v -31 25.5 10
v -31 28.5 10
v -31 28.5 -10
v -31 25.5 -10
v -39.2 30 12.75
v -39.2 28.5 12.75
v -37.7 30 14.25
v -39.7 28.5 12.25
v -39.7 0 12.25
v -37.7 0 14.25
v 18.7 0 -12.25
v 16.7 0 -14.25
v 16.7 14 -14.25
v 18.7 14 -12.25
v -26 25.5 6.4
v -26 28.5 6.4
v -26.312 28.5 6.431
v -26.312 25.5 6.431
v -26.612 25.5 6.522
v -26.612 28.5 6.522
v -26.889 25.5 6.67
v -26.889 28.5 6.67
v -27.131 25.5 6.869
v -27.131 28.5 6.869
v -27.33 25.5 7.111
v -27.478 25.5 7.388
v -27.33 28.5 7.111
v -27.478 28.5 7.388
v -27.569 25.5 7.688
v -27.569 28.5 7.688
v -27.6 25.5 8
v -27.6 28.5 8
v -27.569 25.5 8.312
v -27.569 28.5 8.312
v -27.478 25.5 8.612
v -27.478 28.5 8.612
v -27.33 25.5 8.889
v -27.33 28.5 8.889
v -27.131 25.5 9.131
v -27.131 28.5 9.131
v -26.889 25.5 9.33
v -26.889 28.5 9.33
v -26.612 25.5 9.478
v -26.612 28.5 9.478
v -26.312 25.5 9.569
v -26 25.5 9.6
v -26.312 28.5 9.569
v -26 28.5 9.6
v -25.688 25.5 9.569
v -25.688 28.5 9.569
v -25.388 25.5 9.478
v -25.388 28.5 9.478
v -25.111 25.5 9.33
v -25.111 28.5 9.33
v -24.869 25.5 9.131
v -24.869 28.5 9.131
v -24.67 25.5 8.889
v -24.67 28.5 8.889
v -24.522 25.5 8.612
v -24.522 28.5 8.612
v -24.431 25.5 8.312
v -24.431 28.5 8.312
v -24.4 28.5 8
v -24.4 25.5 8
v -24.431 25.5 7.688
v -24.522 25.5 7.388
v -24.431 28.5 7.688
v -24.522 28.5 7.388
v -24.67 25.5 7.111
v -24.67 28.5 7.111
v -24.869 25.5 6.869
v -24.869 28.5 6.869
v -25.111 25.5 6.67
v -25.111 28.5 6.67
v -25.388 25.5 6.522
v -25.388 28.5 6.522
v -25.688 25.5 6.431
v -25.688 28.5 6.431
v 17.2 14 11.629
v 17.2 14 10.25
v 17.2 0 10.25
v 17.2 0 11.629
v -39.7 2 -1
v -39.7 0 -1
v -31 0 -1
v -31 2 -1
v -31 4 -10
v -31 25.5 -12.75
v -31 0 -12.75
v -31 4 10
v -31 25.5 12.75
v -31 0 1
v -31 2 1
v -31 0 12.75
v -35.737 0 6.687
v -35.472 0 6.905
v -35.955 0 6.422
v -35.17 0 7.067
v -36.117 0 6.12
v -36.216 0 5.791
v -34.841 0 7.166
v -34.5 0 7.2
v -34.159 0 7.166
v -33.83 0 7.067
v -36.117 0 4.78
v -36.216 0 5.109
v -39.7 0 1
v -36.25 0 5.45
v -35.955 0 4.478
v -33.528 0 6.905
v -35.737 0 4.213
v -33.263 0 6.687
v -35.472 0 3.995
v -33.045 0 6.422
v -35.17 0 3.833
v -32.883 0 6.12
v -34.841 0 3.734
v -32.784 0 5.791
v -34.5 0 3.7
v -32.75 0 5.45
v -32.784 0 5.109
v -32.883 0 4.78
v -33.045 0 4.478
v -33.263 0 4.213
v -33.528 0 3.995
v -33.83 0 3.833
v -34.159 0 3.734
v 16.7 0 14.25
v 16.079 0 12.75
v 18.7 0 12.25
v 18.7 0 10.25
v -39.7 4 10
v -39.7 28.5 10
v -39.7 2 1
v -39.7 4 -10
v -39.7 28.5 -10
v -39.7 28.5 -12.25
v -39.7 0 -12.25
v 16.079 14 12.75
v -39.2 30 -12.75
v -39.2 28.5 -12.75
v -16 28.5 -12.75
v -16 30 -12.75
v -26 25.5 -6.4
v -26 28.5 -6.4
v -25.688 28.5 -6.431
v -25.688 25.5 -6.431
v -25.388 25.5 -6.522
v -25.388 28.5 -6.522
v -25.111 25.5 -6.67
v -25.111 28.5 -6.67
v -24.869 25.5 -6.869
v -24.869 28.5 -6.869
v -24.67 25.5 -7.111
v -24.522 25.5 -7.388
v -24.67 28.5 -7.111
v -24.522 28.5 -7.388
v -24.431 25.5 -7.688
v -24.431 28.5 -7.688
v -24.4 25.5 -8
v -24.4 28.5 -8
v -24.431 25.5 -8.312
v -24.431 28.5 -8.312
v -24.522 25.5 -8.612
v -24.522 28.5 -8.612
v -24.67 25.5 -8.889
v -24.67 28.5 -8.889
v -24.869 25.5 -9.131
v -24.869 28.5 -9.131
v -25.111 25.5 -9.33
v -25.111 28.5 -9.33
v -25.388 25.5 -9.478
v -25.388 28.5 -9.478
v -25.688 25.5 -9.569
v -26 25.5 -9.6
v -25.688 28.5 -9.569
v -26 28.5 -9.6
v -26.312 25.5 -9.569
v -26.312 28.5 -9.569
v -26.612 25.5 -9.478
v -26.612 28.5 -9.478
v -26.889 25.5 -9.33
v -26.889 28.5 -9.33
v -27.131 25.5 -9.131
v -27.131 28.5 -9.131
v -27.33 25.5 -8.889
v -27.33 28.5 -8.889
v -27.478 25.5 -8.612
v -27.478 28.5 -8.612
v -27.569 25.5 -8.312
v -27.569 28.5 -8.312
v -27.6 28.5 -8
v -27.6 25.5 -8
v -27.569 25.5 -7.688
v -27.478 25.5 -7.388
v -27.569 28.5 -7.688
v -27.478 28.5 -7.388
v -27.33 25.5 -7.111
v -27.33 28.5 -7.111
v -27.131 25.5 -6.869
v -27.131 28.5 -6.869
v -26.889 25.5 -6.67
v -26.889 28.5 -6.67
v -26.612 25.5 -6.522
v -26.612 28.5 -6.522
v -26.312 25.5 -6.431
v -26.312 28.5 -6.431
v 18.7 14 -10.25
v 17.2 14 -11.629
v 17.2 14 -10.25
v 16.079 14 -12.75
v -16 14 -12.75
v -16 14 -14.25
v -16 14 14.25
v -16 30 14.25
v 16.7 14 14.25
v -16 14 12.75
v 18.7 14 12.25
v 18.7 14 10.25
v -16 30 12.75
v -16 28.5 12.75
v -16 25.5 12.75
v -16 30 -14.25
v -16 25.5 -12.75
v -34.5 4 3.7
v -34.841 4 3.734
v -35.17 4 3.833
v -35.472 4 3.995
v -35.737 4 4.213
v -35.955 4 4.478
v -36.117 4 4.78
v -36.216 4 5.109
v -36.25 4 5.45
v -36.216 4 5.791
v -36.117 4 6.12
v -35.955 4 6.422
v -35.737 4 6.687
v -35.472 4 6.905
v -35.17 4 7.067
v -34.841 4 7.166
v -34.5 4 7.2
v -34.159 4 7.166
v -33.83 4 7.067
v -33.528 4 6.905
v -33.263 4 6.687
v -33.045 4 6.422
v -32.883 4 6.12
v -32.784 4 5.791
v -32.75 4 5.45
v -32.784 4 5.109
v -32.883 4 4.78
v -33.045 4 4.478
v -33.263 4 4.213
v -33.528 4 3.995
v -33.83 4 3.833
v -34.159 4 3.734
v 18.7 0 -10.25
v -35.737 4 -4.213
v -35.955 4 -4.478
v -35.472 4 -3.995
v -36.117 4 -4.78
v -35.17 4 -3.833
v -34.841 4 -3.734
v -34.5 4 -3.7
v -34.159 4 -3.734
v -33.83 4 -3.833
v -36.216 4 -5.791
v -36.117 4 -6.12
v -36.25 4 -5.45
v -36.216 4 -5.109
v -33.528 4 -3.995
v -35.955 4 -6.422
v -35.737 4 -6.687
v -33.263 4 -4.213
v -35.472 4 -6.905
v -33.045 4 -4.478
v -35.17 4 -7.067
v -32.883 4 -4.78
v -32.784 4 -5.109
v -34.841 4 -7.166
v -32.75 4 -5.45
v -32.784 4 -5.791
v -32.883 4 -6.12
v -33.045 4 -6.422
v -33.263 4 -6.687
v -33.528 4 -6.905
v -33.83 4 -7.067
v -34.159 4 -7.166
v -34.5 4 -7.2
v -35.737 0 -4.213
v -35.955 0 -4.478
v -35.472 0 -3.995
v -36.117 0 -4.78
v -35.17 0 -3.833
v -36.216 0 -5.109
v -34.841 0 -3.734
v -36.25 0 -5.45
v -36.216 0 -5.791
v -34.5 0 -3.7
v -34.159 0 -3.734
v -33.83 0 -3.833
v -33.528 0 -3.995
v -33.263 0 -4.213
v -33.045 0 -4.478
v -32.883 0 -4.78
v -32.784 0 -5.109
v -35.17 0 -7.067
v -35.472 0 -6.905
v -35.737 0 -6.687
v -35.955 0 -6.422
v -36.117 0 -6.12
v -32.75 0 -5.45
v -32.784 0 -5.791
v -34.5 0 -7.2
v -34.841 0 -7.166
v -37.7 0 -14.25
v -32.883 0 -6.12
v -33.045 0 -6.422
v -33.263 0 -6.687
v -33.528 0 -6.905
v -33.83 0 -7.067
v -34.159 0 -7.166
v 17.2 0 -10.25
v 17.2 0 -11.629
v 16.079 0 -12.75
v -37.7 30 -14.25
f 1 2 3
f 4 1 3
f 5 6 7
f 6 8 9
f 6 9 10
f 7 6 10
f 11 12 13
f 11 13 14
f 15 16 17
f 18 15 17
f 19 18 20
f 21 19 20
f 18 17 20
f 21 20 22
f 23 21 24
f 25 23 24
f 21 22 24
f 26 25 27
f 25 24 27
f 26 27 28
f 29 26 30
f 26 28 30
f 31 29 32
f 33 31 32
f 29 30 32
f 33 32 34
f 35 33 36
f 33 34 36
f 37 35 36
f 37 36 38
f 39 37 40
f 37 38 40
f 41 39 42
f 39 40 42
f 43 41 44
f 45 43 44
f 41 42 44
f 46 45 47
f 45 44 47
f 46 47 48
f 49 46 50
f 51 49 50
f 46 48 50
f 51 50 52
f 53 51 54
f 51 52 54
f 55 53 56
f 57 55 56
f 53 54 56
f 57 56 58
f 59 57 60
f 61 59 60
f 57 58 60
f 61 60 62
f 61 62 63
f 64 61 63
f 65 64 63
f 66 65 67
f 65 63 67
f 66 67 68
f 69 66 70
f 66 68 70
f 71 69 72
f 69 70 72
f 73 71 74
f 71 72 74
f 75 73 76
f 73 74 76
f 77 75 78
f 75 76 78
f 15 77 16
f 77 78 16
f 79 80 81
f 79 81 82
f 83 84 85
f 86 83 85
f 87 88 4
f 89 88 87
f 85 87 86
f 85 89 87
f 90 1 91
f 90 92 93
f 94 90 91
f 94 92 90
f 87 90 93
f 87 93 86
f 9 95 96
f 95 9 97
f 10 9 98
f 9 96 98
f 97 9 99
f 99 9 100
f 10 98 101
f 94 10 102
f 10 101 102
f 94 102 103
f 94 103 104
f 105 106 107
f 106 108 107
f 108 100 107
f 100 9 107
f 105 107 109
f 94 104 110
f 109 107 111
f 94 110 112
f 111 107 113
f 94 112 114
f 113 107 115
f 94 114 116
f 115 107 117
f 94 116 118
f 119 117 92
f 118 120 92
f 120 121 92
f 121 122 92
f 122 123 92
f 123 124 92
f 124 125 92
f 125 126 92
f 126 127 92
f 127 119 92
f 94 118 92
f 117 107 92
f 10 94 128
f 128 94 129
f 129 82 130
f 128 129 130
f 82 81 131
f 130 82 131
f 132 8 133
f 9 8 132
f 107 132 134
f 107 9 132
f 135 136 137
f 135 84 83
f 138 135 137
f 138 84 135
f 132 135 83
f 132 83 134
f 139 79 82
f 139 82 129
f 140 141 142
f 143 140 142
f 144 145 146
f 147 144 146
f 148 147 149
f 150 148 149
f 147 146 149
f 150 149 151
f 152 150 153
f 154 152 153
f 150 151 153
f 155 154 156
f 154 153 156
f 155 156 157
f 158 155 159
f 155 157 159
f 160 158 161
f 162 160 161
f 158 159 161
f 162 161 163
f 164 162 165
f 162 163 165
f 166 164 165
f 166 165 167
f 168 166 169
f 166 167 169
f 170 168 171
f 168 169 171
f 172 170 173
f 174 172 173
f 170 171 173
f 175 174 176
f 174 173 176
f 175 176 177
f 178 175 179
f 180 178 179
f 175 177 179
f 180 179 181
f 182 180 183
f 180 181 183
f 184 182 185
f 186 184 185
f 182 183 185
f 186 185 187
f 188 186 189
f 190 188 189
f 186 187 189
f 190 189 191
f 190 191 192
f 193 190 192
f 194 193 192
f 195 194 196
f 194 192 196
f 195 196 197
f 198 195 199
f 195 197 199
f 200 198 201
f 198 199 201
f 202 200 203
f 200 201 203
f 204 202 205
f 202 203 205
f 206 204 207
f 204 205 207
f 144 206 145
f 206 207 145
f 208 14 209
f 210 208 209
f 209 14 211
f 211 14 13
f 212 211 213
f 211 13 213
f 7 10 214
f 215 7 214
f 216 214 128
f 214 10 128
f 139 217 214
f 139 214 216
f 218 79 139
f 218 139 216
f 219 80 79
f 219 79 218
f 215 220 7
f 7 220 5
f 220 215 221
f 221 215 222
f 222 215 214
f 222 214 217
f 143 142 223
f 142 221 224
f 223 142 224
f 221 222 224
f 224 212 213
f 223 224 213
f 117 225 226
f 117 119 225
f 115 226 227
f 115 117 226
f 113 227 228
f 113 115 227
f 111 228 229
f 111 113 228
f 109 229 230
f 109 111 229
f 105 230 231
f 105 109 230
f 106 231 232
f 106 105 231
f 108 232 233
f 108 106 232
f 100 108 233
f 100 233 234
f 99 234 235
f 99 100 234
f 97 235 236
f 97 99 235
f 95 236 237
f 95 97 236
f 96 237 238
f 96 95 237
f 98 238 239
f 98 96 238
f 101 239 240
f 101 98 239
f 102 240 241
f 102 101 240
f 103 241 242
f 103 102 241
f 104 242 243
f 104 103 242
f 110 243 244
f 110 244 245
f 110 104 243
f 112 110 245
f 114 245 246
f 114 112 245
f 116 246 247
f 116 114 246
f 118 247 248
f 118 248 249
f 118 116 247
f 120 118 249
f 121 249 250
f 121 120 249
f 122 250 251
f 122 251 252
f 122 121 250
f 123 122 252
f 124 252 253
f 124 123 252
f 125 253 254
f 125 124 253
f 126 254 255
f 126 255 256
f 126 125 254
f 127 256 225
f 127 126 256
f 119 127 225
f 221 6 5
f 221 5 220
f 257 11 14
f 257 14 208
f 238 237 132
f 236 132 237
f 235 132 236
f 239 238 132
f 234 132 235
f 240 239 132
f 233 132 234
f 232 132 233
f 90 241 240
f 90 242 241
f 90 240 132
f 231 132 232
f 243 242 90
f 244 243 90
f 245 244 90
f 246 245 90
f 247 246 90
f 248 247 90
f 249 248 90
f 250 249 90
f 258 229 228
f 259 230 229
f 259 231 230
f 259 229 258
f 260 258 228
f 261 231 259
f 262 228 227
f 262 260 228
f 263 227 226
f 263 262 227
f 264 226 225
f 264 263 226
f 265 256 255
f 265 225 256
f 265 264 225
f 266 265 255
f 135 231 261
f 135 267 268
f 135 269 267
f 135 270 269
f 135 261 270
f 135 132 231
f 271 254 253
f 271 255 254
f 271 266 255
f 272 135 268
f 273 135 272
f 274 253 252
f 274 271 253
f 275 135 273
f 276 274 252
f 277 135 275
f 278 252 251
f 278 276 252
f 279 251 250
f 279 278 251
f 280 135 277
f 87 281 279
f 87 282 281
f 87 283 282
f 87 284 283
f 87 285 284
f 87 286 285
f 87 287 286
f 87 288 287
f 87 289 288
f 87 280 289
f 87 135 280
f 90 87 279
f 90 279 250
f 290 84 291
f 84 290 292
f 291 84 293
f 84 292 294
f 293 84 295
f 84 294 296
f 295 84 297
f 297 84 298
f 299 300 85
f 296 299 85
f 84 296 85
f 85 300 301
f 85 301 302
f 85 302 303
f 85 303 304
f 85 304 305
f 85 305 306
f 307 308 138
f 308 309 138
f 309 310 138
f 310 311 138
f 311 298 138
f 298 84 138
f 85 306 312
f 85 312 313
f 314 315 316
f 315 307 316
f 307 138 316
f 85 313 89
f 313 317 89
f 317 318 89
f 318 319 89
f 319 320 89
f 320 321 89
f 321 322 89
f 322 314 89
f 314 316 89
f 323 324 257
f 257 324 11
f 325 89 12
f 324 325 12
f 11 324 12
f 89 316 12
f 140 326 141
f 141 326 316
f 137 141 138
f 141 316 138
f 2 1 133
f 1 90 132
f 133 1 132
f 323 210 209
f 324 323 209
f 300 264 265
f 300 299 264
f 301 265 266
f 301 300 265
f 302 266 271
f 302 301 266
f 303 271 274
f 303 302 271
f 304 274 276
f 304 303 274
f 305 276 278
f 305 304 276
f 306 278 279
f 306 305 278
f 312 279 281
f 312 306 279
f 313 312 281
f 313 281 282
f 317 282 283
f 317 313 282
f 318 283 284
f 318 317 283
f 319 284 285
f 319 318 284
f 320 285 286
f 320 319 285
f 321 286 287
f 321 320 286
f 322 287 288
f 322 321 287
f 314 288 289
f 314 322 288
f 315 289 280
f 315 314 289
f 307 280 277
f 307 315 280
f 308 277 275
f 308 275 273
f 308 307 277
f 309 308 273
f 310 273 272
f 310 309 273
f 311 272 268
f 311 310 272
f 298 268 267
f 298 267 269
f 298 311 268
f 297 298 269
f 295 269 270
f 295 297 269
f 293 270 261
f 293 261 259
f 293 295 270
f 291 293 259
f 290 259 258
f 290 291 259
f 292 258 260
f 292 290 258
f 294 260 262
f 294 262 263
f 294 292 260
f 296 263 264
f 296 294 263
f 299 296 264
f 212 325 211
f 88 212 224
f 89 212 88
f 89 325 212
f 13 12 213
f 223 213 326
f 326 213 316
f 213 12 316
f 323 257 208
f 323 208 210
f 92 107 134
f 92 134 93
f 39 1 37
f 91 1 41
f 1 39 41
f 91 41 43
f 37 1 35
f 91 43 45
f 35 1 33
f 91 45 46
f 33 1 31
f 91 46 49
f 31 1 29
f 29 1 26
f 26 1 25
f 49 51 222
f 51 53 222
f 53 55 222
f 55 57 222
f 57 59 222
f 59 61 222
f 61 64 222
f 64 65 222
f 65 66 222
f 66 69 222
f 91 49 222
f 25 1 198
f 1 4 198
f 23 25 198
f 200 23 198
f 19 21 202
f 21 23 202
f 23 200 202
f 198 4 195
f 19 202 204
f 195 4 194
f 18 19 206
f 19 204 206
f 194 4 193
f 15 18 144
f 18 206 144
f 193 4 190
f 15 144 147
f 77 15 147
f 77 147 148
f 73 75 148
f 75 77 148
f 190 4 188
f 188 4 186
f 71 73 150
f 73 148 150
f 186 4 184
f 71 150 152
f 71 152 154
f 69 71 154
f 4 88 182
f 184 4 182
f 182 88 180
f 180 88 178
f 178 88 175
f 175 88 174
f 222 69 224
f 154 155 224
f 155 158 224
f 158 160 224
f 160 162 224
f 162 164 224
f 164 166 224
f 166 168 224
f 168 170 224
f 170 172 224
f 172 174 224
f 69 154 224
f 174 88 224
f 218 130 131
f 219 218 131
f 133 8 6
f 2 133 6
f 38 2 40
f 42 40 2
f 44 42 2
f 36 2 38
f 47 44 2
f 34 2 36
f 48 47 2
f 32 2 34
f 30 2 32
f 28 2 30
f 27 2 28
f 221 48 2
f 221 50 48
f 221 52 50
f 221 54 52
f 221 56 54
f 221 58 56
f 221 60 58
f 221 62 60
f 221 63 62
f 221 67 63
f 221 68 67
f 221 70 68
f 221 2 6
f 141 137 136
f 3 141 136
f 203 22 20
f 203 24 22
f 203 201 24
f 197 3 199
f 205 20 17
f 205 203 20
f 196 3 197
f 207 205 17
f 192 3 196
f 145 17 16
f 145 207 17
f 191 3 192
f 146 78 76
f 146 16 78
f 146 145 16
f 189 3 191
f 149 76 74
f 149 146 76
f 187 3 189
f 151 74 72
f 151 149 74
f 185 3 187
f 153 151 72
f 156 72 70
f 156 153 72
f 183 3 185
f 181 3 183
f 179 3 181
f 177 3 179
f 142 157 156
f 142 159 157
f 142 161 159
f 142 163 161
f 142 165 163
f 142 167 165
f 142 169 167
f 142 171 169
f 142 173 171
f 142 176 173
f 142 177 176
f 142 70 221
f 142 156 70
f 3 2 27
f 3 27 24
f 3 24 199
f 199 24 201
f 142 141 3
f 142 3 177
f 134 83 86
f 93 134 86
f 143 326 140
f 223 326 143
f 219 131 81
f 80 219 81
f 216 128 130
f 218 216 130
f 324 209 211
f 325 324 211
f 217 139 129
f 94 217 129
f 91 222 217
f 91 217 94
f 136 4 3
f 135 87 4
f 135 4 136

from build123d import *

# Parameters (mm, degrees)
SZKIC1_W                      = 8.7
SZKIC1_H                      = 9
SZKIC1_R                      = 1.75
DODANIE_WYCI_GNI_CIE1_DEPTH   = 2
DODANIE_WYCI_GNI_CIE1_2_DEPTH = 2
SZKIC2_W                      = 8.7
SZKIC2_H                      = 20
SZKIC2_R                      = 1.75
DODANIE_WYCI_GNI_CIE2_DEPTH   = 2
DODANIE_WYCI_GNI_CIE3_DEPTH   = 14
WYTNIJ_WYCI_GNI_CIE1_REACH    = 46.443
DODANIE_WYCI_GNI_CIE7_DEPTH   = 14.5
SZKIC10_W                     = 15
SZKIC10_H                     = 25.5
SZKIC10_R                     = 1.6
DODANIE_WYCI_GNI_CIE9_DEPTH   = 3
DODANIE_WYCI_GNI_CIE10_DEPTH  = 1.5


with BuildPart() as part:
    # Szkic1 → Dodanie-wyciągnięcie1 (new body)
    with BuildSketch(Plane(origin=(0, 0, 0), x_dir=(1, 0, 0), z_dir=(0, 1, 0))):
        with Locations((-35.35, 5.5)):
            Rectangle(SZKIC1_W, SZKIC1_H)
        with Locations(Location((-34.5, 5.45, 0), (0, 0, 270))):
            Circle(SZKIC1_R, mode=Mode.SUBTRACT)
    extrude(amount=DODANIE_WYCI_GNI_CIE1_DEPTH)



with BuildPart() as body_2:
    # Szkic1 → Dodanie-wyci_gni_cie1 2 (new body)
    with BuildSketch(Plane(origin=(0, 0, 0), x_dir=(1, 0, 0), z_dir=(0, 1, 0))):
        with Locations((-35.35, -5.5)):
            Rectangle(SZKIC1_W, SZKIC1_H)
        with Locations(Location((-34.5, -5.45, 0), (0, 0, 90))):
            Circle(SZKIC1_R, mode=Mode.SUBTRACT)
    extrude(amount=DODANIE_WYCI_GNI_CIE1_2_DEPTH)


with BuildPart() as part_1:
    add(part.part)

    add(body_2.part)  # Dodanie-wyciągnięcie2 merges body 2
    # Szkic2 → Dodanie-wyciągnięcie2 (add)
    with BuildSketch(Plane(origin=(0, 2, 0), x_dir=(1, 0, 0), z_dir=(0, 1, 0))):
        with Locations((-35.35, 0)):
            Rectangle(SZKIC2_W, SZKIC2_H)
        with Locations(Location((-34.5, 5.45, 0), (0, 0, 270))):
            Circle(SZKIC2_R, mode=Mode.SUBTRACT)
        with Locations(Location((-34.5, -5.45, 0), (0, 0, 90))):
            Circle(SZKIC2_R, mode=Mode.SUBTRACT)
    extrude(amount=DODANIE_WYCI_GNI_CIE2_DEPTH)

    # Szkic5 → Dodanie-wyciągnięcie3 (add)
    with BuildSketch(Plane(origin=(0, 0, 0), x_dir=(-1, 0, 0), z_dir=(0, -1, 0))):
        Polygon((39.7, -10), (39.7, -12.25), (37.7, -14.25), (-16.7, -14.25), (-18.7, -12.25), (-18.7, -10.25), (31, -10.25), (31, -10), align=None)
        Polygon((39.7, 10), (39.7, 12.25), (37.7, 14.25), (-16.7, 14.25), (-18.7, 12.25), (-18.7, 10.25), (31, 10.25), (31, 10), align=None)
    extrude(amount=-DODANIE_WYCI_GNI_CIE3_DEPTH)

    # Szkic7 → Wytnij-wyciągnięcie1 (cut, up to next)
    with BuildSketch(Plane(origin=(0, 14, 0), x_dir=(1, 0, 0), z_dir=(0, 1, 0)), mode=Mode.PRIVATE) as wytnij_wyci_gni_cie1_sk1:
        Polygon((-31, 10.25), (17.2, 10.25), (17.2, 11.628679656), (16.078679656, 12.75), (-31, 12.75), align=None)
    wytnij_wyci_gni_cie1_tool1 = extrude(wytnij_wyci_gni_cie1_sk1.sketch, amount=-WYTNIJ_WYCI_GNI_CIE1_REACH, mode=Mode.PRIVATE) & part_1.part
    # Szkic7 → Wytnij-wyciągnięcie1 (cut, up to next)
    with BuildSketch(Plane(origin=(0, 14, 0), x_dir=(1, 0, 0), z_dir=(0, 1, 0)), mode=Mode.PRIVATE) as wytnij_wyci_gni_cie1_sk2:
        Polygon((16.078679656, -12.75), (-31, -12.75), (-31, -10.25), (17.2, -10.25), (17.2, -11.628679656), align=None)
    wytnij_wyci_gni_cie1_tool2 = extrude(wytnij_wyci_gni_cie1_sk2.sketch, amount=-WYTNIJ_WYCI_GNI_CIE1_REACH, mode=Mode.PRIVATE) & part_1.part
    add(wytnij_wyci_gni_cie1_tool1.solids().sort_by_distance((-7.024435, 14, -11.495405))[0], mode=Mode.SUBTRACT)
    add(wytnij_wyci_gni_cie1_tool2.solids().sort_by_distance((-7.024435, 14, 11.495405))[0], mode=Mode.SUBTRACT)

    # Szkic8 → Dodanie-wyciągnięcie7 (add)
    with BuildSketch(Plane(origin=(0, 14, 0), x_dir=(1, 0, 0), z_dir=(0, 1, 0))):
        Polygon((-31, 10), (-39.7, 10), (-39.7, 12.25), (-37.7, 14.25), (-16, 14.25), (-16, 12.75), (-31, 12.75), align=None)
        Polygon((-16, -12.75), (-31, -12.75), (-31, -10), (-39.7, -10), (-39.7, -12.25), (-37.7, -14.25), (-16, -14.25), align=None)
    extrude(amount=DODANIE_WYCI_GNI_CIE7_DEPTH)

    # Szkic10 → Dodanie-wyciągnięcie9 (add)
    with BuildSketch(Plane(origin=(0, 28.5, 0), x_dir=(1, 0, 0), z_dir=(0, 1, 0))):
        with Locations((-23.5, 0)):
            Rectangle(SZKIC10_W, SZKIC10_H)
        with Locations(Location((-26, 8, 0), (0, 0, 270))):
            Circle(SZKIC10_R, mode=Mode.SUBTRACT)
        with Locations(Location((-26, -8, 0), (0, 0, 90))):
            Circle(SZKIC10_R, mode=Mode.SUBTRACT)
    extrude(amount=-DODANIE_WYCI_GNI_CIE9_DEPTH)

    # Szkic11 → Dodanie-wyciągnięcie10 (add)
    with BuildSketch(Plane(origin=(0, 28.5, 0), x_dir=(1, 0, 0), z_dir=(0, 1, 0))):
        Polygon((-16, 12.75), (-16, 14.25), (-37.7, 14.25), (-39.2, 12.75), align=None)
        Polygon((-37.7, -14.25), (-39.2, -12.75), (-16, -12.75), (-16, -14.25), align=None)
    extrude(amount=DODANIE_WYCI_GNI_CIE10_DEPTH)


solid = part_1.part
